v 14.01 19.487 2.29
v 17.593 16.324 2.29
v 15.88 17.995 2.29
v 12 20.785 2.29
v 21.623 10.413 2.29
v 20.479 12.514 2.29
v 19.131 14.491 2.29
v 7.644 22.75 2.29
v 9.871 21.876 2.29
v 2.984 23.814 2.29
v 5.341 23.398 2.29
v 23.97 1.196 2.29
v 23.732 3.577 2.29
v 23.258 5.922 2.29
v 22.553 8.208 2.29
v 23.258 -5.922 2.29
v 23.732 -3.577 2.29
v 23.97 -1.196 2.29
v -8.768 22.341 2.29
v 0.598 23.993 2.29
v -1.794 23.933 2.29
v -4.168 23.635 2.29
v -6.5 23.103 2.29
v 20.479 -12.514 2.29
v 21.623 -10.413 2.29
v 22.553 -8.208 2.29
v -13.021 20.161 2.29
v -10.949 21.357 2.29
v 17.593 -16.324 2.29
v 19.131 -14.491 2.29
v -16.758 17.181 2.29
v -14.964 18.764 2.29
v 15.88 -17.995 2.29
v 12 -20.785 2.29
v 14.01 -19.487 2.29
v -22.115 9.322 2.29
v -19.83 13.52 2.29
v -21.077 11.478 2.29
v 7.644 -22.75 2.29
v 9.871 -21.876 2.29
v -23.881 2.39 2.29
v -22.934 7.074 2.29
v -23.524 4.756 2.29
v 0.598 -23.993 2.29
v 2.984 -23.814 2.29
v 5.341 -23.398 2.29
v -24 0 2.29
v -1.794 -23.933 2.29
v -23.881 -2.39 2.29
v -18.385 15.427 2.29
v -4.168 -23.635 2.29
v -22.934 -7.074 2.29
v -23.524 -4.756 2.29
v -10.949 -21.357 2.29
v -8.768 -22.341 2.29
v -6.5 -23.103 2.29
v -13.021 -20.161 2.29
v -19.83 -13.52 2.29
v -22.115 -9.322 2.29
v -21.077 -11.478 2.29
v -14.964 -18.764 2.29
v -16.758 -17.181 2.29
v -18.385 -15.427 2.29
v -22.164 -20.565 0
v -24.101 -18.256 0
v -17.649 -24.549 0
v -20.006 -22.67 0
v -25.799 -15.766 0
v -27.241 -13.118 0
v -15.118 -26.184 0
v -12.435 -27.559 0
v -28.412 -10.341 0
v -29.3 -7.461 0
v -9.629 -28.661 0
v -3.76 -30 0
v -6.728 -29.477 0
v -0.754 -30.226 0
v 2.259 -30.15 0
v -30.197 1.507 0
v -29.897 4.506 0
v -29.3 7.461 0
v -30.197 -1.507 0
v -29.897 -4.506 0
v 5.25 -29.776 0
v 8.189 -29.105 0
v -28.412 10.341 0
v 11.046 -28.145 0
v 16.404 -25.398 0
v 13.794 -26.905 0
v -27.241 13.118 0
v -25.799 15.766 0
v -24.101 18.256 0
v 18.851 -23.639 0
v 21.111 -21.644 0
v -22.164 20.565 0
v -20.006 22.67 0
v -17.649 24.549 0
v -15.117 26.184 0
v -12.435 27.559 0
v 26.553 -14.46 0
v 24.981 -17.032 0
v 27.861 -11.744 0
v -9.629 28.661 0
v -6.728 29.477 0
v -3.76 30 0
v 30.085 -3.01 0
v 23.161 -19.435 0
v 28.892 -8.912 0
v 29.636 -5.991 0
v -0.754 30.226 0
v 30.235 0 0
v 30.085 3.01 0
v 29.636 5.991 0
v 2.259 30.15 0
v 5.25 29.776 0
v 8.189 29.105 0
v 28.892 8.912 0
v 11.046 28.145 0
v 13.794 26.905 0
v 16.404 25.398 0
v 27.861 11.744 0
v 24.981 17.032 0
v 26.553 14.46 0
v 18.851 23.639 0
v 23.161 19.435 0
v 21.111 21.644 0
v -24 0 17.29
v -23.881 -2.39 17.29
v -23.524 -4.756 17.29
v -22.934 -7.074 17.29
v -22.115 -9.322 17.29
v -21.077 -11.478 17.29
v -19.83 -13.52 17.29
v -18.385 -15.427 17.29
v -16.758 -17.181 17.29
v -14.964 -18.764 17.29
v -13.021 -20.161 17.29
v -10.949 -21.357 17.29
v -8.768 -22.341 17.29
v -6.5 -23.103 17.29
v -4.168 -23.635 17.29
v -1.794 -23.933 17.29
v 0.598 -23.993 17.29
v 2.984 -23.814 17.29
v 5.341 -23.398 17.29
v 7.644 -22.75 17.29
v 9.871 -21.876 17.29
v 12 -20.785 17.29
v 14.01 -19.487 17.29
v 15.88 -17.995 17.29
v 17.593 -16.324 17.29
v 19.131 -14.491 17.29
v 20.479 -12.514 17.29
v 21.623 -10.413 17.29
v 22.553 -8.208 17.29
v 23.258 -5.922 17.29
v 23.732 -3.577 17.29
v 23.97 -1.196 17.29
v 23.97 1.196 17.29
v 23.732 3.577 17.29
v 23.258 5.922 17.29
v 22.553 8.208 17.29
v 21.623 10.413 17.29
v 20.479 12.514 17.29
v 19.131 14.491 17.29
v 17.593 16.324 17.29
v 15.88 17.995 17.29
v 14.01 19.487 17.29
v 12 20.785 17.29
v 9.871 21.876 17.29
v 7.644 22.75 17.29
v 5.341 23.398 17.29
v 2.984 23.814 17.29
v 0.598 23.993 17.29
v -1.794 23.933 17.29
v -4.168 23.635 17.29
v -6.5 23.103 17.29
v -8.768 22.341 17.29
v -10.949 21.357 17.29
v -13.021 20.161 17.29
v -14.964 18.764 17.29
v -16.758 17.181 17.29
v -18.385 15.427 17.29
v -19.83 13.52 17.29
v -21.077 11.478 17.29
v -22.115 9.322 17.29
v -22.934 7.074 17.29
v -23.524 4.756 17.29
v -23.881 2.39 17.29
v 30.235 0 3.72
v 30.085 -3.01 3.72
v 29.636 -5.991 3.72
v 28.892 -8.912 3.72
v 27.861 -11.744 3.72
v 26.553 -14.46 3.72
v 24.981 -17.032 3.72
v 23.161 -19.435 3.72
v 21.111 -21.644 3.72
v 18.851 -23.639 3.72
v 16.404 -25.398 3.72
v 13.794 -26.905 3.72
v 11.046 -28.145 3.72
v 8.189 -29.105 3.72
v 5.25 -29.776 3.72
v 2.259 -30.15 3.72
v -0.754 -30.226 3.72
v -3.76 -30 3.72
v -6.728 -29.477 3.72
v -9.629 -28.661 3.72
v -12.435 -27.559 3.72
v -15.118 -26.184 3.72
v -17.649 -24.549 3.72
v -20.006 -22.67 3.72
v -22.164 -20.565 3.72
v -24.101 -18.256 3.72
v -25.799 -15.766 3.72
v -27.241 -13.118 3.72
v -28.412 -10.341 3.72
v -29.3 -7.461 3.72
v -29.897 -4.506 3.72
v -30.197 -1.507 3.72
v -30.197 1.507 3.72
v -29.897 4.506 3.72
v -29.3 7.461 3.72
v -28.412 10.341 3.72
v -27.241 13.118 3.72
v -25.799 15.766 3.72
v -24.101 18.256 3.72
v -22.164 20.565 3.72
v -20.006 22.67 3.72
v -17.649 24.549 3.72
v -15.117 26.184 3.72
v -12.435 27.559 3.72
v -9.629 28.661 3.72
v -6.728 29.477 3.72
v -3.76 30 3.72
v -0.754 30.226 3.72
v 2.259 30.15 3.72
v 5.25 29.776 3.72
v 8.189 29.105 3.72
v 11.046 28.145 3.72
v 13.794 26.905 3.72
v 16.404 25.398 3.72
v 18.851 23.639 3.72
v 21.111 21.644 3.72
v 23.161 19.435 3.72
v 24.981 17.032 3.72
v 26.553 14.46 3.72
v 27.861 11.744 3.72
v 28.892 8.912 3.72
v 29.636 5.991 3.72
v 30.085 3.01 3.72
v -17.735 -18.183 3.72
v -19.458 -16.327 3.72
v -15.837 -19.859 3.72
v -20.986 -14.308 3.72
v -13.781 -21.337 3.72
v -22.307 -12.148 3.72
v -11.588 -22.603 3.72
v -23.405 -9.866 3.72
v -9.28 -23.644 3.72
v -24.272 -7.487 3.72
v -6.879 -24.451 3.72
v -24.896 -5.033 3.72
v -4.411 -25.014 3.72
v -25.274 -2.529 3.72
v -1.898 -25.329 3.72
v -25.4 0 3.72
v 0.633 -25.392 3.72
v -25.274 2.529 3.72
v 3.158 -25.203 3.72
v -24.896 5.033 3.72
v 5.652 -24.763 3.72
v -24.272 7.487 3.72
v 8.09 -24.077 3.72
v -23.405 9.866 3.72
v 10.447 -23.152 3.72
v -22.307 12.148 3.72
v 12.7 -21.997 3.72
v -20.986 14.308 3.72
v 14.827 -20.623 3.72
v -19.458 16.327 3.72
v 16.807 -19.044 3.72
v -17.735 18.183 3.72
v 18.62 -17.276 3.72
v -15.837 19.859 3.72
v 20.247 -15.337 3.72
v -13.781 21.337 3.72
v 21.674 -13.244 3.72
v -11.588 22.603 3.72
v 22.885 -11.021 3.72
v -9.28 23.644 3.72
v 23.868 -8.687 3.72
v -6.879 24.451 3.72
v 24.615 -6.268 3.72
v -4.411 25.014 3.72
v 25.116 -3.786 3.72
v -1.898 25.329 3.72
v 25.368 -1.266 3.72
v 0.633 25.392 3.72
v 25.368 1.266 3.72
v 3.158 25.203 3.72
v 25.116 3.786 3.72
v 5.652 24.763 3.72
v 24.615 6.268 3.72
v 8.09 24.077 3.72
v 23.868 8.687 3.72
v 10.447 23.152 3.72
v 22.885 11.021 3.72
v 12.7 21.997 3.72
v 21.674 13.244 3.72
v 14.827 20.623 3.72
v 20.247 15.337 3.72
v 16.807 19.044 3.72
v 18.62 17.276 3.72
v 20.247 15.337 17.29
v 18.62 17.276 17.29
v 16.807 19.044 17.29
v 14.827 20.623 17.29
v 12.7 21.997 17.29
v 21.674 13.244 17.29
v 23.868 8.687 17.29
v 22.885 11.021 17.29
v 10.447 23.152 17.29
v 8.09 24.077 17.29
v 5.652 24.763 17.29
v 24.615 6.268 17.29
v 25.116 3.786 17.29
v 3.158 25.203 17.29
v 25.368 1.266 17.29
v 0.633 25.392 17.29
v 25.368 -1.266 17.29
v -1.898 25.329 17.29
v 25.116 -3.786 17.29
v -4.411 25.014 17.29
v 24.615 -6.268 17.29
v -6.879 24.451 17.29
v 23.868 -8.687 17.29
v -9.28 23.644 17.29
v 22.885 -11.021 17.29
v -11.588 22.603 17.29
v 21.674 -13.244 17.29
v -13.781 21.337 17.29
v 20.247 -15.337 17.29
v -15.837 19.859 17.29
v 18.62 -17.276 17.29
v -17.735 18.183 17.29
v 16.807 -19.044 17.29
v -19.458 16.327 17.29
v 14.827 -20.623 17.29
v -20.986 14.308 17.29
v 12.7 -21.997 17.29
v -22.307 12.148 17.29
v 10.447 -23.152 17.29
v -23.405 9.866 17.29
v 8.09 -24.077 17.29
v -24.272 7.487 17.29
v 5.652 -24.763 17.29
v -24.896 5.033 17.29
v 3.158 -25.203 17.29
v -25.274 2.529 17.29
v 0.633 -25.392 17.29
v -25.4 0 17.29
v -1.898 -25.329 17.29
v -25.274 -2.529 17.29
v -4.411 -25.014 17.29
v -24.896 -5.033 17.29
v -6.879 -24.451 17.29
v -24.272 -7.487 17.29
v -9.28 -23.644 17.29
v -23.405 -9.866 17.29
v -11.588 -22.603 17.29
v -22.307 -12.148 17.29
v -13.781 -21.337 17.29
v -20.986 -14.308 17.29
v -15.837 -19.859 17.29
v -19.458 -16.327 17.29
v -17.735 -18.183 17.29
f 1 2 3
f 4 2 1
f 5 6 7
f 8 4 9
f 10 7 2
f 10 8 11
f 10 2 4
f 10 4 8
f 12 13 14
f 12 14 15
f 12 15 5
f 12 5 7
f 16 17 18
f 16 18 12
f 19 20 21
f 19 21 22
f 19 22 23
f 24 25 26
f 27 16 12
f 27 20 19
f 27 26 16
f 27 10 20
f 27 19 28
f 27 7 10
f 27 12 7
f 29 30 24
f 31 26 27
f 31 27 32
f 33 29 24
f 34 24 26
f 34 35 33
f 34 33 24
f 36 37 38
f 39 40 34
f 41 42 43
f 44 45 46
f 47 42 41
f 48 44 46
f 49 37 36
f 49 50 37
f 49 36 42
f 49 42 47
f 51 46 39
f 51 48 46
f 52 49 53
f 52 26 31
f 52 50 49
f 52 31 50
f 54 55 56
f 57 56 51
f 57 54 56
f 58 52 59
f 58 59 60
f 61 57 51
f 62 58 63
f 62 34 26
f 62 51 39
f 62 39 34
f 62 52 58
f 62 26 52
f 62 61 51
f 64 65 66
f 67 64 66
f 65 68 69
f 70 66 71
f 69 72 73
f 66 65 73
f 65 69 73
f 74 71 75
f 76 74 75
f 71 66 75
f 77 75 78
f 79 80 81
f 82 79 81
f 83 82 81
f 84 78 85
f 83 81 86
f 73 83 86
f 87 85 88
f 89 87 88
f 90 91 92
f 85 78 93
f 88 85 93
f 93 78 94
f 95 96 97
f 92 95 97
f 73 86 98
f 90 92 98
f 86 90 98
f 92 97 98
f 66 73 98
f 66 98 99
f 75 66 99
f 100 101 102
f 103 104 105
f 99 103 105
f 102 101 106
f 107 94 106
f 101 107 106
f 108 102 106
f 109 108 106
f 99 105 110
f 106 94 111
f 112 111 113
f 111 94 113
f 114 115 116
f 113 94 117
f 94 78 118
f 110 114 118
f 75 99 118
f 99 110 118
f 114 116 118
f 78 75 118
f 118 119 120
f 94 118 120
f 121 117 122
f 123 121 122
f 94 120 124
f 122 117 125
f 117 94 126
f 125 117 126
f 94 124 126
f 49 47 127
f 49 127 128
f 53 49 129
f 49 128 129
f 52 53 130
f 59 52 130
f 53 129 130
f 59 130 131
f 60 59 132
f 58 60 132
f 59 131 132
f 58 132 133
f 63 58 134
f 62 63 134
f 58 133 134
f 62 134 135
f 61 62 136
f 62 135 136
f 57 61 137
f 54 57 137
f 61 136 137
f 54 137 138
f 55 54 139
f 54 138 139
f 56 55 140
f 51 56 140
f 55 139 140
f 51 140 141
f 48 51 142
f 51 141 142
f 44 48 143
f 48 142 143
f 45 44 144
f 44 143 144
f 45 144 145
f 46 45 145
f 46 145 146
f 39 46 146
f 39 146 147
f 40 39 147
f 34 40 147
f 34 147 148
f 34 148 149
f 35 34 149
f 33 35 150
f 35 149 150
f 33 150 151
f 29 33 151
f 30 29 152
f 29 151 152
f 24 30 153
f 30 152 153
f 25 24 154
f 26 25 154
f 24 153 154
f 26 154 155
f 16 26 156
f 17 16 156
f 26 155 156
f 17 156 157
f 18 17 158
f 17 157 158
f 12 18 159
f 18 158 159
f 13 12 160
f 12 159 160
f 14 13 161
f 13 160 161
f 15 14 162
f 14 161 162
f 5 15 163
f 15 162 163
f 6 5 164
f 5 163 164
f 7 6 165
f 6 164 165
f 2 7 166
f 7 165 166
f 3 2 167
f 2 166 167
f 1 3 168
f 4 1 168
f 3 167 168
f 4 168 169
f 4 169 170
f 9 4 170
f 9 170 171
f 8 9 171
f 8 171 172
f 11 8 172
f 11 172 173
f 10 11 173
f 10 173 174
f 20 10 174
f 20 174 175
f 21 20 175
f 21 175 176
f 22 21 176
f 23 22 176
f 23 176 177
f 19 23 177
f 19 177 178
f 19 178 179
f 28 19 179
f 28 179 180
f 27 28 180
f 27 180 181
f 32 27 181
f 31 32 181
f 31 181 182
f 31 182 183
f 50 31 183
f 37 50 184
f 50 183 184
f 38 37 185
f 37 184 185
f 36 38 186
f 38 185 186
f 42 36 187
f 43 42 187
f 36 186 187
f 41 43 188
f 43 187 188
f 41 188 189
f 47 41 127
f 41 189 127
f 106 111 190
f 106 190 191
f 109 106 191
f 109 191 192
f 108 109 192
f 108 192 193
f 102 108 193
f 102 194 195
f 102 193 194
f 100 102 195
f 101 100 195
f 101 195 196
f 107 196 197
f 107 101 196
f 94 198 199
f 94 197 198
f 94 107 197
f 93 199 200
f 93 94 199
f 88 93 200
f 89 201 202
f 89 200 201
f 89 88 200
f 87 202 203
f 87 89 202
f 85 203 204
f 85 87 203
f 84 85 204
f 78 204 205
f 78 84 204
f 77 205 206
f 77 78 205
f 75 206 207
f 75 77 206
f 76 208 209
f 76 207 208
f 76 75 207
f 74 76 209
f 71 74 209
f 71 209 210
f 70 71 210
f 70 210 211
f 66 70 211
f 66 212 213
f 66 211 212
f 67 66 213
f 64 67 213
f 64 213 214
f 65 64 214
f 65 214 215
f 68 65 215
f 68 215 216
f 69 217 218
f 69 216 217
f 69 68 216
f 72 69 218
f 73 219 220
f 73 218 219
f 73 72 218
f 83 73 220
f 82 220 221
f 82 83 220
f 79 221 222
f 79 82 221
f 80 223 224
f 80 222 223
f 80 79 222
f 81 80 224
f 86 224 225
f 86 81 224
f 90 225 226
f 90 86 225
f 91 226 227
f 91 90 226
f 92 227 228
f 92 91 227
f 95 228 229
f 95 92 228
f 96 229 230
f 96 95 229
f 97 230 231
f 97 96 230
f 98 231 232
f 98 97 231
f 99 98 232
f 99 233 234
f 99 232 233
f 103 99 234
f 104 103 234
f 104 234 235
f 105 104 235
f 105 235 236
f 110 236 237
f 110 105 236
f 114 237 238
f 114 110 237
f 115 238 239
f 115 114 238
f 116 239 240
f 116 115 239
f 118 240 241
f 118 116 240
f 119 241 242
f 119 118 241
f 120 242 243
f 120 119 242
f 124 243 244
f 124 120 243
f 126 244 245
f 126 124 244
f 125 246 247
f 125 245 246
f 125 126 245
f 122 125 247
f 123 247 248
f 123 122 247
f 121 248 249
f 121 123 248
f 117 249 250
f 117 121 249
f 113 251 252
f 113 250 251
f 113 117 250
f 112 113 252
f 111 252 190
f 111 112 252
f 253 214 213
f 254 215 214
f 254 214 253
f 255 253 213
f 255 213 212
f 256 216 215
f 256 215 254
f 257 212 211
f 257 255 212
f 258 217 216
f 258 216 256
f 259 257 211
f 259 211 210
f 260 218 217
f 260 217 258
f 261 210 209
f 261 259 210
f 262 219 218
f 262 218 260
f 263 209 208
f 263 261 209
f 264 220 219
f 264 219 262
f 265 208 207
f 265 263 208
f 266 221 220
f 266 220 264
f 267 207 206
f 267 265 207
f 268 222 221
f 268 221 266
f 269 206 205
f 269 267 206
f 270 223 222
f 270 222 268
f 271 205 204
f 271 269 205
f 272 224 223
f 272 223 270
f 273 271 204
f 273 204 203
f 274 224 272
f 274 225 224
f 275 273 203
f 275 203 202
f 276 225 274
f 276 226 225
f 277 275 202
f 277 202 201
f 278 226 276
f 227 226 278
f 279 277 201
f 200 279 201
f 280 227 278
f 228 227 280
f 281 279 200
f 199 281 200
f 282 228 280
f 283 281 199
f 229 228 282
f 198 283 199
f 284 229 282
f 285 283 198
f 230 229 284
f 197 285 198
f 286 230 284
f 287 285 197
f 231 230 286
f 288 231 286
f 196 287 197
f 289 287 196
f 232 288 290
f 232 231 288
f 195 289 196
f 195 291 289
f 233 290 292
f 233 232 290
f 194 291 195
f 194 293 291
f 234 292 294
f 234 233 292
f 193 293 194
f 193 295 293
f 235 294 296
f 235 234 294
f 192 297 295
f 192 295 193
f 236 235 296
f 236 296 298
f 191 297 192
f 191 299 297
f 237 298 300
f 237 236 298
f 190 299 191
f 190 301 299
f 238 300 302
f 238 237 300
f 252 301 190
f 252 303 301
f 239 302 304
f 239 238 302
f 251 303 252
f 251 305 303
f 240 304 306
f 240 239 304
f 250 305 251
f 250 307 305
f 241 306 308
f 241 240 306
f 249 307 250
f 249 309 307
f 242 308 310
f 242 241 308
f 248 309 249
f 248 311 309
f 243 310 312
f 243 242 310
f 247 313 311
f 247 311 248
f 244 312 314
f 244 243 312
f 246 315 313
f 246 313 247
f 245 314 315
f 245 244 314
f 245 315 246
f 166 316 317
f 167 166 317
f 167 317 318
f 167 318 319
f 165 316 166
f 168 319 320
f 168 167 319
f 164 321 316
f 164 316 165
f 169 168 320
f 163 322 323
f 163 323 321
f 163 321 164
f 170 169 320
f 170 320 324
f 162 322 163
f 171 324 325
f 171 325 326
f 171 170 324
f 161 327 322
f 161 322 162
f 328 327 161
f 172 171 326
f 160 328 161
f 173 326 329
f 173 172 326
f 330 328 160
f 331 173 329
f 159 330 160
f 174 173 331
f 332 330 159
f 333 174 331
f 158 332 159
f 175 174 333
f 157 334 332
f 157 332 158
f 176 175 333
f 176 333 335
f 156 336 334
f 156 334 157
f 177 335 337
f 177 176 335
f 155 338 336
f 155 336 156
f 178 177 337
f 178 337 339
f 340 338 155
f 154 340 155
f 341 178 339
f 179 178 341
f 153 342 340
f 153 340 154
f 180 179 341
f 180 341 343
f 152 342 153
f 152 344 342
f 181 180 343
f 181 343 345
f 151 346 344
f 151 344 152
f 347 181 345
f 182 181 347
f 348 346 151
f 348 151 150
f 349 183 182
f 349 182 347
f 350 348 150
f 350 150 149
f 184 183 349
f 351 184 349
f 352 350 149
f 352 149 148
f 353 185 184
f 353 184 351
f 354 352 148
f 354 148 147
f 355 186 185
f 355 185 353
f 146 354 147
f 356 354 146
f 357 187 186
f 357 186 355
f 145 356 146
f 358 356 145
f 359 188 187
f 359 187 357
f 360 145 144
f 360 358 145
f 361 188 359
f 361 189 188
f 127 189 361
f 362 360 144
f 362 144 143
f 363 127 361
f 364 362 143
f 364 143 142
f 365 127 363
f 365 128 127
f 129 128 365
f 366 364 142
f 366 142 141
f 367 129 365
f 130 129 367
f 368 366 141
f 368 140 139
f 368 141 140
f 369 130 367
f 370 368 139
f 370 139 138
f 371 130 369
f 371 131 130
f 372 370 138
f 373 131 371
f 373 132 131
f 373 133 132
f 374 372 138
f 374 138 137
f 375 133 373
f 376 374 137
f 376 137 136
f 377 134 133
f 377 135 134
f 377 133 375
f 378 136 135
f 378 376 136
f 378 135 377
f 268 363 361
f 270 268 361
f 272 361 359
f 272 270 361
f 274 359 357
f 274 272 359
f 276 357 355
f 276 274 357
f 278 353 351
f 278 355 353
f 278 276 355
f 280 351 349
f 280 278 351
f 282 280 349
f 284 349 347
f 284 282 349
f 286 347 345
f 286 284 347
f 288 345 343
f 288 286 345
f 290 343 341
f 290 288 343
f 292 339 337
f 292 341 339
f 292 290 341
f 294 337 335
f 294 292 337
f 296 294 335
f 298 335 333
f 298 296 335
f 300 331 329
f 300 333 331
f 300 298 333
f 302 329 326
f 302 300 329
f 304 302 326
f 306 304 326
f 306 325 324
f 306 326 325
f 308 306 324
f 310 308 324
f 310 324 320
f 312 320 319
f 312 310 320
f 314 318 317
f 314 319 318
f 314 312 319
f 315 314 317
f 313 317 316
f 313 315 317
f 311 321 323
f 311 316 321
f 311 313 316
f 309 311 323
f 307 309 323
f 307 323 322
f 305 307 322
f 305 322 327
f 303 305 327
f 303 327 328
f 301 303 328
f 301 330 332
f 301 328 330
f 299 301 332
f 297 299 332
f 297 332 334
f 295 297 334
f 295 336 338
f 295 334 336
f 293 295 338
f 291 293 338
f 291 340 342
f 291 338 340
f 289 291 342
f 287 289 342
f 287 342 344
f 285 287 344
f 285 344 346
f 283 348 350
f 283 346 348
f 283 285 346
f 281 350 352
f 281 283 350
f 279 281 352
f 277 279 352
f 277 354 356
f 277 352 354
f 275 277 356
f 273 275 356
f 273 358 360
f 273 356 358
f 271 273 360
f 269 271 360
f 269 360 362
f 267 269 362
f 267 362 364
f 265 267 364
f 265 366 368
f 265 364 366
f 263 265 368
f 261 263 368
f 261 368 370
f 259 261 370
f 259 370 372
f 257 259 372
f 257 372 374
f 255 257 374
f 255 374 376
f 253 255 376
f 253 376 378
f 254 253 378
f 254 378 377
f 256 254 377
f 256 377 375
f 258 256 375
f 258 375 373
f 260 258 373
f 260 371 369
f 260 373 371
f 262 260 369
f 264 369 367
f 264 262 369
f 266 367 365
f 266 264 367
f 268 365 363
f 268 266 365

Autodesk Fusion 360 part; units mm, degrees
sketch "Sketch1" plane through (0, 0, 0) normal (0, 0, 1) x (1, 0, 0)
  circle A0 centre (0, 0) radius 30.235
  dimension "d1" = 60.47
extrude "Extrude1" add sketch "Sketch1" along normal blind 3.72
sketch "Sketch2" plane through (0, 0, 3.72) normal (0, 0, 1) x (-1, 0, 0)
  circle A0 centre (0, 0) radius 30.235
  circle A1 centre (0, 0) radius 25.4
  dimension "d4" = 50.8
extrude "Extrude2" add sketch "Sketch2" along normal blind 13.57 contours A1
sketch "Sketch3" plane through (0, 0, 17.29) normal (0, 0, 1) x (-1, 0, 0)
  circle A0 centre (0, 0) radius 25.4
  circle A1 centre (0, 0) radius 24
  dimension "d10" = 48
extrude "Extrude3" cut sketch "Sketch3" against normal blind 15 contours A1
